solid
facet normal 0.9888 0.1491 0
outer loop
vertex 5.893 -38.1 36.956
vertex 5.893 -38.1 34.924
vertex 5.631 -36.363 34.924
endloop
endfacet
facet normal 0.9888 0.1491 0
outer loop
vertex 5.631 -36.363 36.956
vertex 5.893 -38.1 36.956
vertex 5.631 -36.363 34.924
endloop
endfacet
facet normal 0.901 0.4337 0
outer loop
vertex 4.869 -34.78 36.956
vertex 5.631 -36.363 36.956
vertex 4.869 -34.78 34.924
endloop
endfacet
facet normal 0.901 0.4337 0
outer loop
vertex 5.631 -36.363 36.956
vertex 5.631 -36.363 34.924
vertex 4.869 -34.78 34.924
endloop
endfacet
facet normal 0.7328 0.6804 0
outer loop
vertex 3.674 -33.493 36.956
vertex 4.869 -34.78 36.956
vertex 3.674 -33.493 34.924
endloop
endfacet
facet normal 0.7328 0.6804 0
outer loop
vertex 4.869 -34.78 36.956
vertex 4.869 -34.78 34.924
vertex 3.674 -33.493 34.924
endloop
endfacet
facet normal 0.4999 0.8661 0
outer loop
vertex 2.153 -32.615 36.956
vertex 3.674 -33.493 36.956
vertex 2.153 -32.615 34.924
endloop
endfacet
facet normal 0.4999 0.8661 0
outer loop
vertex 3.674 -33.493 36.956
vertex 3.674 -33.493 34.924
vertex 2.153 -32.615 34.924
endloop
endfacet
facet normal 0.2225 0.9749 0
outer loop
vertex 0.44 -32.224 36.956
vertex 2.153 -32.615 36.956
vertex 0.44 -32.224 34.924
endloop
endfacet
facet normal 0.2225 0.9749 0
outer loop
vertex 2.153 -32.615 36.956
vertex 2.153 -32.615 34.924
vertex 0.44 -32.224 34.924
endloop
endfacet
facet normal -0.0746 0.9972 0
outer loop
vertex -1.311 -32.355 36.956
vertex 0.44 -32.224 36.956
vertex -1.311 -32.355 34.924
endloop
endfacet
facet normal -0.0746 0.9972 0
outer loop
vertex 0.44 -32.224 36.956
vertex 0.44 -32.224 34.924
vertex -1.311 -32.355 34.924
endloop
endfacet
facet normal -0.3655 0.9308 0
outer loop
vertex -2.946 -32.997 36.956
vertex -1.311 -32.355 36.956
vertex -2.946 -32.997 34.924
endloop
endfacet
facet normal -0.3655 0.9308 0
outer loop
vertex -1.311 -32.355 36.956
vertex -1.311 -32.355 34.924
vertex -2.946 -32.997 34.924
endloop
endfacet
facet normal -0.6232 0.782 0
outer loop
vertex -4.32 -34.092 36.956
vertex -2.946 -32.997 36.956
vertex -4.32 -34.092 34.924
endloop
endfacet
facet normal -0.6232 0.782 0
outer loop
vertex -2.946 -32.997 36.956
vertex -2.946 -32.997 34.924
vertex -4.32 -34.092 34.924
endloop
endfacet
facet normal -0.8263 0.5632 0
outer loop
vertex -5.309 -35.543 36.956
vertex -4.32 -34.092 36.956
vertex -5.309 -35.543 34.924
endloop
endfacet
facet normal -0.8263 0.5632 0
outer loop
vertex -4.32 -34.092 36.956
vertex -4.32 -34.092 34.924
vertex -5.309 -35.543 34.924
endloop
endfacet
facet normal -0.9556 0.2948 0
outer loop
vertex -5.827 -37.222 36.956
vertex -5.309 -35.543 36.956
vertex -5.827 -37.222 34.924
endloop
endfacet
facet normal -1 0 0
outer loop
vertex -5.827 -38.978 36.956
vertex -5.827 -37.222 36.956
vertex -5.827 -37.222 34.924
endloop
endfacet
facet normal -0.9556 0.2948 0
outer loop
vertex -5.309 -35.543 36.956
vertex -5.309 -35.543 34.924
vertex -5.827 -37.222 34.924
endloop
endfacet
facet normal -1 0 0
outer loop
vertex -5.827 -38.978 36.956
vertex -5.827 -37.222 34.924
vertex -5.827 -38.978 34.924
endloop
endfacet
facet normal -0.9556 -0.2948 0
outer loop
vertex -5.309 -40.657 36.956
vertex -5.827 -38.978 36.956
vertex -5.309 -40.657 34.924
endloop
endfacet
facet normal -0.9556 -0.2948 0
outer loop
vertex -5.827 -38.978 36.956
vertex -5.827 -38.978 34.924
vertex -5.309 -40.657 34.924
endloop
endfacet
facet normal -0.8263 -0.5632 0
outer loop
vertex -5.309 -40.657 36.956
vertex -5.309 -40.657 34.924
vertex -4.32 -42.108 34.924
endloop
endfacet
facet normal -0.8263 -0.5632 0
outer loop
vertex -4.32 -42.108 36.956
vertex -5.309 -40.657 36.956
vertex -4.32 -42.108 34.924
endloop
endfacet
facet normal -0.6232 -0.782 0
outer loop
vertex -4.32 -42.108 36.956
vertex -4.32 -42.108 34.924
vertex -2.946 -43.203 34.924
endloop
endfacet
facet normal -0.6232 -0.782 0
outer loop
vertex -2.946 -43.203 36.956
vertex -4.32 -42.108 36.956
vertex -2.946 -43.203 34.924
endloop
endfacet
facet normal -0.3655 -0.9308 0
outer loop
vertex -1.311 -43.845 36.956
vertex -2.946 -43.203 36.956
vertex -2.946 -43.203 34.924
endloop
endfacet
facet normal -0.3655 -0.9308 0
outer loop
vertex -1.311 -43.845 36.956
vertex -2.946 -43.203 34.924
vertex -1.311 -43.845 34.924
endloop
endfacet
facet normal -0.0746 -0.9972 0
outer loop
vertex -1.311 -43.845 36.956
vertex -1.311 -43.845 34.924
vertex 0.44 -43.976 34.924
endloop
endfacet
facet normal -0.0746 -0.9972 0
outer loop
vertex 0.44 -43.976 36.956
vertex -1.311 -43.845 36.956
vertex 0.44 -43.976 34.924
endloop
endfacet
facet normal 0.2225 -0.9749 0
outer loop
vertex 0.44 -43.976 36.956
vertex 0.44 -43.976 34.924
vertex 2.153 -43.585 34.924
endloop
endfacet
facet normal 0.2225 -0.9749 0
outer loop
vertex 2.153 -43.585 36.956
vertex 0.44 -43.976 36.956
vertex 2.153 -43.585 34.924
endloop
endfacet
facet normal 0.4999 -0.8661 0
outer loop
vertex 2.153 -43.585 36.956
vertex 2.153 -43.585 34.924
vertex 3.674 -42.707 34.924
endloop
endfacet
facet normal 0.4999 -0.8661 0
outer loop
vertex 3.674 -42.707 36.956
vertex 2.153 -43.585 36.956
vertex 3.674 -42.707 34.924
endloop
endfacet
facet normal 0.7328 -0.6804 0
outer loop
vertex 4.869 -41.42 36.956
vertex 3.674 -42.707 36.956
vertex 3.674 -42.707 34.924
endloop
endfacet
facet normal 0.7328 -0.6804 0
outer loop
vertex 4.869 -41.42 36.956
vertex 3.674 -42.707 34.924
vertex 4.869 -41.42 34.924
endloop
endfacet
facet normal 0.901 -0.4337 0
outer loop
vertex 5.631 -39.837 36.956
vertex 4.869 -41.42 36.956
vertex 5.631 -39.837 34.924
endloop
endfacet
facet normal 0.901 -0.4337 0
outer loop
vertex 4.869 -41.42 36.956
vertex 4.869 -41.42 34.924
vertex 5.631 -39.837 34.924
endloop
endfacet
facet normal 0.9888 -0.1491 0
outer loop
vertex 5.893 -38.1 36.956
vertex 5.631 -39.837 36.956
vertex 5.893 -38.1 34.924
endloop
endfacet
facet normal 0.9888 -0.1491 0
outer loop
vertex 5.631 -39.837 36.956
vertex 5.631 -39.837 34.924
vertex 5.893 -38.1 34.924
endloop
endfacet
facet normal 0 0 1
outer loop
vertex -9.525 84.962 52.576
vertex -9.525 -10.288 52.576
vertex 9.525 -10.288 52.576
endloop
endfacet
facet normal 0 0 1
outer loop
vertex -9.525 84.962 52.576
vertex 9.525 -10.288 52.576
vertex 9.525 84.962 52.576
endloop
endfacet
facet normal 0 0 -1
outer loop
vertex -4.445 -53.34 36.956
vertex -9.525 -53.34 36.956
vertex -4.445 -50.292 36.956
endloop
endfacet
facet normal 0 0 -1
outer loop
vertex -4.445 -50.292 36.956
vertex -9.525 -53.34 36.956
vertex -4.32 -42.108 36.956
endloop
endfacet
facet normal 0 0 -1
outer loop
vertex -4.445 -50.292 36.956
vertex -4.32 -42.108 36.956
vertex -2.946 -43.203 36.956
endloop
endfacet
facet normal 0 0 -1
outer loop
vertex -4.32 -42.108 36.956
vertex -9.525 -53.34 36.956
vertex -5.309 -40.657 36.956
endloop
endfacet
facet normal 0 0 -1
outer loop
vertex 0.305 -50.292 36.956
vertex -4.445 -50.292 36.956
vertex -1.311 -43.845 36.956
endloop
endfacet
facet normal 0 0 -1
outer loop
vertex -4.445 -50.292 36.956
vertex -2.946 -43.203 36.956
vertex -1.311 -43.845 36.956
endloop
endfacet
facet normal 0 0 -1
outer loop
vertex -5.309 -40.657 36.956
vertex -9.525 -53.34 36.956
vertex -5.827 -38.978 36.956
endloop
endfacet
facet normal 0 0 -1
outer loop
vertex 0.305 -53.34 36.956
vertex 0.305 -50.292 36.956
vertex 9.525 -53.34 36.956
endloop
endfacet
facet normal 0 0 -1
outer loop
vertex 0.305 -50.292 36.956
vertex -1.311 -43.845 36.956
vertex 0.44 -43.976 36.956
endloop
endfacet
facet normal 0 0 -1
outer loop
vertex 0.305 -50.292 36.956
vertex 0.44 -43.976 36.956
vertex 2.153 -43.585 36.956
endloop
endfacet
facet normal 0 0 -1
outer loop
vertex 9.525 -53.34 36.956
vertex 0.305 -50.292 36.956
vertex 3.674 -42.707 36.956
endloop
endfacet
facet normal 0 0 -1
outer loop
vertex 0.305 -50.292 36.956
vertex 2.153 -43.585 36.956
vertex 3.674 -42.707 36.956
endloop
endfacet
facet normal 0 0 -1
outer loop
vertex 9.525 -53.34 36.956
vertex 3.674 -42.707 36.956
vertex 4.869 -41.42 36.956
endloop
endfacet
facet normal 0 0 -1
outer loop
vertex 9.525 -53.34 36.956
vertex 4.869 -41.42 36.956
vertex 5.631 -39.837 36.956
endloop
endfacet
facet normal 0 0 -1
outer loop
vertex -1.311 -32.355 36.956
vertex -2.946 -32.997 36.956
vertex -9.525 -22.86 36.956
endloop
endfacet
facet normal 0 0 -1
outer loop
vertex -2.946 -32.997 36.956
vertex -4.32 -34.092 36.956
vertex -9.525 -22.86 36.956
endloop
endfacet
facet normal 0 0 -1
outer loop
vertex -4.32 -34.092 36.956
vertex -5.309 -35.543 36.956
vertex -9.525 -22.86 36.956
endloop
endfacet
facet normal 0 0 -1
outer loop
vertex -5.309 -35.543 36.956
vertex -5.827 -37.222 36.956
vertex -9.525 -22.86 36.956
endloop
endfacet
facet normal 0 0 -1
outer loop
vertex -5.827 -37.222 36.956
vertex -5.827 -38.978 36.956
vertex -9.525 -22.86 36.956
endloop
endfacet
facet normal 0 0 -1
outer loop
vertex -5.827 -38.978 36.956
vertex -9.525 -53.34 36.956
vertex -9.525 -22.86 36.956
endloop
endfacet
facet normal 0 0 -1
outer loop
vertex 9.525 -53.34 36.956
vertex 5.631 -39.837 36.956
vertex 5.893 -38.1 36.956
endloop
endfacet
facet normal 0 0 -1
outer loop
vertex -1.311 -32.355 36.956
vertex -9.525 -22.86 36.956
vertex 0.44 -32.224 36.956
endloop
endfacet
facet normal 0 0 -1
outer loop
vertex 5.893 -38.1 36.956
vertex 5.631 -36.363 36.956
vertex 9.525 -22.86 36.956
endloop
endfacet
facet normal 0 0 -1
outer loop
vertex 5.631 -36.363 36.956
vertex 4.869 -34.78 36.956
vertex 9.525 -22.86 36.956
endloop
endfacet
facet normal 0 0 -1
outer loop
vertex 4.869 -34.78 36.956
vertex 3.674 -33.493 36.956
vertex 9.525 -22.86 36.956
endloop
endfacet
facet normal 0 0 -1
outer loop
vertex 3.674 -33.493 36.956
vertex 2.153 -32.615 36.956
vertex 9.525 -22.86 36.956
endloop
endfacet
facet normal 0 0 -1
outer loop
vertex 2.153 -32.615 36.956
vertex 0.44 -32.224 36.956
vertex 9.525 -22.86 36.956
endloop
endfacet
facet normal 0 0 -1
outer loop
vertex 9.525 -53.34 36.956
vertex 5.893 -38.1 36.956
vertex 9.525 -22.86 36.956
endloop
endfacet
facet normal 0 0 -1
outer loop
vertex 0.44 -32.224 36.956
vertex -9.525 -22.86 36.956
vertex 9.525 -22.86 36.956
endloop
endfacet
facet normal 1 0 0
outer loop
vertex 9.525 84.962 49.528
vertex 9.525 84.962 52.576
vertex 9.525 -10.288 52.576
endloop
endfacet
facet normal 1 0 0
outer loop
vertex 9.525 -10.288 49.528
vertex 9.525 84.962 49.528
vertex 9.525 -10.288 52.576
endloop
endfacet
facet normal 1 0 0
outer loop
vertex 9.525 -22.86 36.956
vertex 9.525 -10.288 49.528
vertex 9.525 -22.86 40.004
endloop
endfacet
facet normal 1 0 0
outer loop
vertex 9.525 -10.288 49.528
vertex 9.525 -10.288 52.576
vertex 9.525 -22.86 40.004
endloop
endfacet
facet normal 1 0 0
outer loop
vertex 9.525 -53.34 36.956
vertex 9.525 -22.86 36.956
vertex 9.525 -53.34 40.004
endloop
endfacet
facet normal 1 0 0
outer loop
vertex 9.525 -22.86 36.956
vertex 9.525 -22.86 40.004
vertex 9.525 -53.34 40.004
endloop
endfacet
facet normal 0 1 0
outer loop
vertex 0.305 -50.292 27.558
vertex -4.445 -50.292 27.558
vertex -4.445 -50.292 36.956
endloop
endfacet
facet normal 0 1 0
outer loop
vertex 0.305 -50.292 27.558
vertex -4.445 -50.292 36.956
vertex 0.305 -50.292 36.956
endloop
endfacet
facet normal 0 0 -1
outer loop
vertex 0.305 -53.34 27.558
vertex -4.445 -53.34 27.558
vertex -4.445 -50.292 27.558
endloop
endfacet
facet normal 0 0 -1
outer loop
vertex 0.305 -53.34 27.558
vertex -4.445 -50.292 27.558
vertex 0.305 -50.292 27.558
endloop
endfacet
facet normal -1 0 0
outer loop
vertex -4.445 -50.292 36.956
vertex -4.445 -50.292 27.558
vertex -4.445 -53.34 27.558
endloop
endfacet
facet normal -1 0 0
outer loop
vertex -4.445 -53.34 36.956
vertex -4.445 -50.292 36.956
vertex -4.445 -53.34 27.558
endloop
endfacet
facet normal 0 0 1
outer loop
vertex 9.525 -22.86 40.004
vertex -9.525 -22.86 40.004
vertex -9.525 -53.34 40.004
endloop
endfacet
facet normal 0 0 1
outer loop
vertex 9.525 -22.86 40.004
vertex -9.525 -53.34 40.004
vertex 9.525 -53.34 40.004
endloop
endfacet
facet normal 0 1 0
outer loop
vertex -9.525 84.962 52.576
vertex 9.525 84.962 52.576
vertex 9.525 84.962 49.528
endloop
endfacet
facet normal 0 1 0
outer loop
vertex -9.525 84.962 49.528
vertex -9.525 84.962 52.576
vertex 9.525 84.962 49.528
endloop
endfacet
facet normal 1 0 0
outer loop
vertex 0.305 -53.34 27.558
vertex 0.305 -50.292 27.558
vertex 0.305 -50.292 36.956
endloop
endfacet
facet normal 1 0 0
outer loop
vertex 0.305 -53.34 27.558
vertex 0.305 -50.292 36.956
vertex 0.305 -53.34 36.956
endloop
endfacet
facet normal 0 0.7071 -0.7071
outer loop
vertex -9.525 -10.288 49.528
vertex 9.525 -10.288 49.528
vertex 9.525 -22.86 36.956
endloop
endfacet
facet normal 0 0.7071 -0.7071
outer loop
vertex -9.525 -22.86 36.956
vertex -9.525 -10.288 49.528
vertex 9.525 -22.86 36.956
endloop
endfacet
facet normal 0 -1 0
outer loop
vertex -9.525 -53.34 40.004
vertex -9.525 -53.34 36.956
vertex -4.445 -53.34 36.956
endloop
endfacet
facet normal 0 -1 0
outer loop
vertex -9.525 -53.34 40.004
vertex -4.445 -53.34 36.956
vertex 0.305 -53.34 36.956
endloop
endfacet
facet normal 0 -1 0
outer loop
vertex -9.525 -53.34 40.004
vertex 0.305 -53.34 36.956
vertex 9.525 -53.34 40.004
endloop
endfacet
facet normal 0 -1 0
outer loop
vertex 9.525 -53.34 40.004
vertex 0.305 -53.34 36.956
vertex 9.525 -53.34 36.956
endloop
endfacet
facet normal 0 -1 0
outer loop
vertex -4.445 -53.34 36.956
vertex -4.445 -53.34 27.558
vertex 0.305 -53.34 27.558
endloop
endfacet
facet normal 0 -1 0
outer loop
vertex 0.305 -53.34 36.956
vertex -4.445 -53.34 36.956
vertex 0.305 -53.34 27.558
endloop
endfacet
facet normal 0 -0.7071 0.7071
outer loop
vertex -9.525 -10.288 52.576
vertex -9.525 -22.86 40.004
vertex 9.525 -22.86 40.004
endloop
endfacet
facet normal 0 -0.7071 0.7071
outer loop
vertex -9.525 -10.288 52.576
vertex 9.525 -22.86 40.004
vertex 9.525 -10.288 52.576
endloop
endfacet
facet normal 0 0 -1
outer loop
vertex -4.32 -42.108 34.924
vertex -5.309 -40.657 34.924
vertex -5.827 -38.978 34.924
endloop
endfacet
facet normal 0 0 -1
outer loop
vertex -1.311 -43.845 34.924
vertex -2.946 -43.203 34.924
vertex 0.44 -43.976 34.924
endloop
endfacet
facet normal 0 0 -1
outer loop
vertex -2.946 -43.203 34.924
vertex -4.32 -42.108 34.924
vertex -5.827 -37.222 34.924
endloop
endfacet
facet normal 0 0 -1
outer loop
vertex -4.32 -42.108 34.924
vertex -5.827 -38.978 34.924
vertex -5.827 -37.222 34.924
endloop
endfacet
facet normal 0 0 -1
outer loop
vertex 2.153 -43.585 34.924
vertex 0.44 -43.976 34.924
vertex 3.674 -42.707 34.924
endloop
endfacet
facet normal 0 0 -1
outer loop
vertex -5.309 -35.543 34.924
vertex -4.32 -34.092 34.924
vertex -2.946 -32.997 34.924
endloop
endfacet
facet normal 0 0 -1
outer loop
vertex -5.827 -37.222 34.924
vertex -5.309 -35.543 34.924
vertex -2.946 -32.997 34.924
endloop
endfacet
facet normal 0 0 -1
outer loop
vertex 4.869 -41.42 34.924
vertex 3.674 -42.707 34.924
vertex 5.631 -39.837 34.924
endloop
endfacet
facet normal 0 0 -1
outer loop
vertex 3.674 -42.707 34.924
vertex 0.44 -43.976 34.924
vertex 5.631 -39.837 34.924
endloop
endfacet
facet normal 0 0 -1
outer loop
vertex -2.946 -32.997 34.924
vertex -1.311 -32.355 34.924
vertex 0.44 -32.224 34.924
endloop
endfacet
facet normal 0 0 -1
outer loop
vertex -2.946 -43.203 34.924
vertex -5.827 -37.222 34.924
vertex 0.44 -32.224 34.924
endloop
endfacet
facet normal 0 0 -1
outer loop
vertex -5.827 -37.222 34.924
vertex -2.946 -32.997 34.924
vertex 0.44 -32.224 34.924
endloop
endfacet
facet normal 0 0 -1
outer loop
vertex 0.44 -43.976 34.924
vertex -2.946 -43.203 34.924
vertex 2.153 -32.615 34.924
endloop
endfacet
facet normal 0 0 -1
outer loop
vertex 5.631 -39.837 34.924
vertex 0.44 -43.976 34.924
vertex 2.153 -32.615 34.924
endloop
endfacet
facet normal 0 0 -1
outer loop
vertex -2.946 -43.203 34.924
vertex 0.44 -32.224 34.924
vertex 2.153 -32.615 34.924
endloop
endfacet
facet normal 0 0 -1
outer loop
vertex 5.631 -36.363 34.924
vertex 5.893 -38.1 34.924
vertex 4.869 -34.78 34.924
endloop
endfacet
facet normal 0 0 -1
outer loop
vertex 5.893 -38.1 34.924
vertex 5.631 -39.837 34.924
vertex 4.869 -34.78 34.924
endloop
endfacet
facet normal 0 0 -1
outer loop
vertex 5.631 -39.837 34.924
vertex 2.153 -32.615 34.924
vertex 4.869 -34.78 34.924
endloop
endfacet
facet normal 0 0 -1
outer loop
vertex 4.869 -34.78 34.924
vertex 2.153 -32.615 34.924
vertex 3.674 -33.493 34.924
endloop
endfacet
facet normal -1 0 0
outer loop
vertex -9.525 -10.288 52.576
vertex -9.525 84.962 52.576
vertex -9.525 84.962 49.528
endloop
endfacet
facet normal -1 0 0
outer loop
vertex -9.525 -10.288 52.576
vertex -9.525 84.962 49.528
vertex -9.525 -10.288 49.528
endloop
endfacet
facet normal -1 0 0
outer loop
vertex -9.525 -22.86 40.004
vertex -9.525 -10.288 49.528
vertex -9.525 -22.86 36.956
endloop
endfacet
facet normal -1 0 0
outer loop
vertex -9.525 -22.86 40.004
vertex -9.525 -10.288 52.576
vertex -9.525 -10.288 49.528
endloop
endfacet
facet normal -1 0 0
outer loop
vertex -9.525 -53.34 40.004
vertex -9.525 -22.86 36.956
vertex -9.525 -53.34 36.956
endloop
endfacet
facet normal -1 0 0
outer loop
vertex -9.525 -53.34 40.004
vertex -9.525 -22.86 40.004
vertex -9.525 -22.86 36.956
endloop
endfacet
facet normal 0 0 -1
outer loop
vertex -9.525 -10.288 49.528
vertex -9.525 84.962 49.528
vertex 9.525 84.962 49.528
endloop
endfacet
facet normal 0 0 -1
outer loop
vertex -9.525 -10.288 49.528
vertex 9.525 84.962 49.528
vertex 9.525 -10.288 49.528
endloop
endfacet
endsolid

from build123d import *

# Parameters (mm, degrees)
CYLINDER003_R     = 5.8928
CYLINDER003_DEPTH = 2.032
SKETCH003_W       = 19.05
SKETCH003_H       = 30.48
PAD_DEPTH         = 3.048
PAD001_DEPTH      = 19.05
SKETCH005_W       = 4.7498
SKETCH005_H       = 3.048
PAD002_DEPTH      = 9.398


with BuildPart() as part:
    # Cylinder003 → Cylinder003 (new body)
    with BuildSketch(Plane(origin=(0, -38.1, 34.923527), x_dir=(1, 0, 0), z_dir=(0, 0, 1))):
        Circle(CYLINDER003_R)
    extrude(amount=CYLINDER003_DEPTH)

    # Sketch003 → Pad (new body)
    with BuildSketch(Plane(origin=(0, -38.1, 36.955527), x_dir=(1, 0, 0), z_dir=(0, 0, 1))):
        Rectangle(SKETCH003_W, SKETCH003_H)
    extrude(amount=PAD_DEPTH)

    # Sketch004 → Pad001 (new body)
    with BuildSketch(Plane(origin=(-9.525, -38.1, 34.923527), x_dir=(0, -1, 0), z_dir=(-1, 0, 0))):
        Polygon((-15.24, 5.08), (-27.812359, 17.652359), (-123.062359, 17.652359), (-123.062359, 14.604359), (-27.812359, 14.604359), (-15.24, 2.032), align=None)
    extrude(amount=-PAD001_DEPTH)

    # Sketch005 → Pad002 (new body)
    with BuildSketch(Plane(origin=(0, -38.1, 36.955527), x_dir=(1, 0, 0), z_dir=(0, 0, -1))):
        with Locations((-2.0701, 13.716)):
            Rectangle(SKETCH005_W, SKETCH005_H)
    extrude(amount=PAD002_DEPTH)


solid = part.part
